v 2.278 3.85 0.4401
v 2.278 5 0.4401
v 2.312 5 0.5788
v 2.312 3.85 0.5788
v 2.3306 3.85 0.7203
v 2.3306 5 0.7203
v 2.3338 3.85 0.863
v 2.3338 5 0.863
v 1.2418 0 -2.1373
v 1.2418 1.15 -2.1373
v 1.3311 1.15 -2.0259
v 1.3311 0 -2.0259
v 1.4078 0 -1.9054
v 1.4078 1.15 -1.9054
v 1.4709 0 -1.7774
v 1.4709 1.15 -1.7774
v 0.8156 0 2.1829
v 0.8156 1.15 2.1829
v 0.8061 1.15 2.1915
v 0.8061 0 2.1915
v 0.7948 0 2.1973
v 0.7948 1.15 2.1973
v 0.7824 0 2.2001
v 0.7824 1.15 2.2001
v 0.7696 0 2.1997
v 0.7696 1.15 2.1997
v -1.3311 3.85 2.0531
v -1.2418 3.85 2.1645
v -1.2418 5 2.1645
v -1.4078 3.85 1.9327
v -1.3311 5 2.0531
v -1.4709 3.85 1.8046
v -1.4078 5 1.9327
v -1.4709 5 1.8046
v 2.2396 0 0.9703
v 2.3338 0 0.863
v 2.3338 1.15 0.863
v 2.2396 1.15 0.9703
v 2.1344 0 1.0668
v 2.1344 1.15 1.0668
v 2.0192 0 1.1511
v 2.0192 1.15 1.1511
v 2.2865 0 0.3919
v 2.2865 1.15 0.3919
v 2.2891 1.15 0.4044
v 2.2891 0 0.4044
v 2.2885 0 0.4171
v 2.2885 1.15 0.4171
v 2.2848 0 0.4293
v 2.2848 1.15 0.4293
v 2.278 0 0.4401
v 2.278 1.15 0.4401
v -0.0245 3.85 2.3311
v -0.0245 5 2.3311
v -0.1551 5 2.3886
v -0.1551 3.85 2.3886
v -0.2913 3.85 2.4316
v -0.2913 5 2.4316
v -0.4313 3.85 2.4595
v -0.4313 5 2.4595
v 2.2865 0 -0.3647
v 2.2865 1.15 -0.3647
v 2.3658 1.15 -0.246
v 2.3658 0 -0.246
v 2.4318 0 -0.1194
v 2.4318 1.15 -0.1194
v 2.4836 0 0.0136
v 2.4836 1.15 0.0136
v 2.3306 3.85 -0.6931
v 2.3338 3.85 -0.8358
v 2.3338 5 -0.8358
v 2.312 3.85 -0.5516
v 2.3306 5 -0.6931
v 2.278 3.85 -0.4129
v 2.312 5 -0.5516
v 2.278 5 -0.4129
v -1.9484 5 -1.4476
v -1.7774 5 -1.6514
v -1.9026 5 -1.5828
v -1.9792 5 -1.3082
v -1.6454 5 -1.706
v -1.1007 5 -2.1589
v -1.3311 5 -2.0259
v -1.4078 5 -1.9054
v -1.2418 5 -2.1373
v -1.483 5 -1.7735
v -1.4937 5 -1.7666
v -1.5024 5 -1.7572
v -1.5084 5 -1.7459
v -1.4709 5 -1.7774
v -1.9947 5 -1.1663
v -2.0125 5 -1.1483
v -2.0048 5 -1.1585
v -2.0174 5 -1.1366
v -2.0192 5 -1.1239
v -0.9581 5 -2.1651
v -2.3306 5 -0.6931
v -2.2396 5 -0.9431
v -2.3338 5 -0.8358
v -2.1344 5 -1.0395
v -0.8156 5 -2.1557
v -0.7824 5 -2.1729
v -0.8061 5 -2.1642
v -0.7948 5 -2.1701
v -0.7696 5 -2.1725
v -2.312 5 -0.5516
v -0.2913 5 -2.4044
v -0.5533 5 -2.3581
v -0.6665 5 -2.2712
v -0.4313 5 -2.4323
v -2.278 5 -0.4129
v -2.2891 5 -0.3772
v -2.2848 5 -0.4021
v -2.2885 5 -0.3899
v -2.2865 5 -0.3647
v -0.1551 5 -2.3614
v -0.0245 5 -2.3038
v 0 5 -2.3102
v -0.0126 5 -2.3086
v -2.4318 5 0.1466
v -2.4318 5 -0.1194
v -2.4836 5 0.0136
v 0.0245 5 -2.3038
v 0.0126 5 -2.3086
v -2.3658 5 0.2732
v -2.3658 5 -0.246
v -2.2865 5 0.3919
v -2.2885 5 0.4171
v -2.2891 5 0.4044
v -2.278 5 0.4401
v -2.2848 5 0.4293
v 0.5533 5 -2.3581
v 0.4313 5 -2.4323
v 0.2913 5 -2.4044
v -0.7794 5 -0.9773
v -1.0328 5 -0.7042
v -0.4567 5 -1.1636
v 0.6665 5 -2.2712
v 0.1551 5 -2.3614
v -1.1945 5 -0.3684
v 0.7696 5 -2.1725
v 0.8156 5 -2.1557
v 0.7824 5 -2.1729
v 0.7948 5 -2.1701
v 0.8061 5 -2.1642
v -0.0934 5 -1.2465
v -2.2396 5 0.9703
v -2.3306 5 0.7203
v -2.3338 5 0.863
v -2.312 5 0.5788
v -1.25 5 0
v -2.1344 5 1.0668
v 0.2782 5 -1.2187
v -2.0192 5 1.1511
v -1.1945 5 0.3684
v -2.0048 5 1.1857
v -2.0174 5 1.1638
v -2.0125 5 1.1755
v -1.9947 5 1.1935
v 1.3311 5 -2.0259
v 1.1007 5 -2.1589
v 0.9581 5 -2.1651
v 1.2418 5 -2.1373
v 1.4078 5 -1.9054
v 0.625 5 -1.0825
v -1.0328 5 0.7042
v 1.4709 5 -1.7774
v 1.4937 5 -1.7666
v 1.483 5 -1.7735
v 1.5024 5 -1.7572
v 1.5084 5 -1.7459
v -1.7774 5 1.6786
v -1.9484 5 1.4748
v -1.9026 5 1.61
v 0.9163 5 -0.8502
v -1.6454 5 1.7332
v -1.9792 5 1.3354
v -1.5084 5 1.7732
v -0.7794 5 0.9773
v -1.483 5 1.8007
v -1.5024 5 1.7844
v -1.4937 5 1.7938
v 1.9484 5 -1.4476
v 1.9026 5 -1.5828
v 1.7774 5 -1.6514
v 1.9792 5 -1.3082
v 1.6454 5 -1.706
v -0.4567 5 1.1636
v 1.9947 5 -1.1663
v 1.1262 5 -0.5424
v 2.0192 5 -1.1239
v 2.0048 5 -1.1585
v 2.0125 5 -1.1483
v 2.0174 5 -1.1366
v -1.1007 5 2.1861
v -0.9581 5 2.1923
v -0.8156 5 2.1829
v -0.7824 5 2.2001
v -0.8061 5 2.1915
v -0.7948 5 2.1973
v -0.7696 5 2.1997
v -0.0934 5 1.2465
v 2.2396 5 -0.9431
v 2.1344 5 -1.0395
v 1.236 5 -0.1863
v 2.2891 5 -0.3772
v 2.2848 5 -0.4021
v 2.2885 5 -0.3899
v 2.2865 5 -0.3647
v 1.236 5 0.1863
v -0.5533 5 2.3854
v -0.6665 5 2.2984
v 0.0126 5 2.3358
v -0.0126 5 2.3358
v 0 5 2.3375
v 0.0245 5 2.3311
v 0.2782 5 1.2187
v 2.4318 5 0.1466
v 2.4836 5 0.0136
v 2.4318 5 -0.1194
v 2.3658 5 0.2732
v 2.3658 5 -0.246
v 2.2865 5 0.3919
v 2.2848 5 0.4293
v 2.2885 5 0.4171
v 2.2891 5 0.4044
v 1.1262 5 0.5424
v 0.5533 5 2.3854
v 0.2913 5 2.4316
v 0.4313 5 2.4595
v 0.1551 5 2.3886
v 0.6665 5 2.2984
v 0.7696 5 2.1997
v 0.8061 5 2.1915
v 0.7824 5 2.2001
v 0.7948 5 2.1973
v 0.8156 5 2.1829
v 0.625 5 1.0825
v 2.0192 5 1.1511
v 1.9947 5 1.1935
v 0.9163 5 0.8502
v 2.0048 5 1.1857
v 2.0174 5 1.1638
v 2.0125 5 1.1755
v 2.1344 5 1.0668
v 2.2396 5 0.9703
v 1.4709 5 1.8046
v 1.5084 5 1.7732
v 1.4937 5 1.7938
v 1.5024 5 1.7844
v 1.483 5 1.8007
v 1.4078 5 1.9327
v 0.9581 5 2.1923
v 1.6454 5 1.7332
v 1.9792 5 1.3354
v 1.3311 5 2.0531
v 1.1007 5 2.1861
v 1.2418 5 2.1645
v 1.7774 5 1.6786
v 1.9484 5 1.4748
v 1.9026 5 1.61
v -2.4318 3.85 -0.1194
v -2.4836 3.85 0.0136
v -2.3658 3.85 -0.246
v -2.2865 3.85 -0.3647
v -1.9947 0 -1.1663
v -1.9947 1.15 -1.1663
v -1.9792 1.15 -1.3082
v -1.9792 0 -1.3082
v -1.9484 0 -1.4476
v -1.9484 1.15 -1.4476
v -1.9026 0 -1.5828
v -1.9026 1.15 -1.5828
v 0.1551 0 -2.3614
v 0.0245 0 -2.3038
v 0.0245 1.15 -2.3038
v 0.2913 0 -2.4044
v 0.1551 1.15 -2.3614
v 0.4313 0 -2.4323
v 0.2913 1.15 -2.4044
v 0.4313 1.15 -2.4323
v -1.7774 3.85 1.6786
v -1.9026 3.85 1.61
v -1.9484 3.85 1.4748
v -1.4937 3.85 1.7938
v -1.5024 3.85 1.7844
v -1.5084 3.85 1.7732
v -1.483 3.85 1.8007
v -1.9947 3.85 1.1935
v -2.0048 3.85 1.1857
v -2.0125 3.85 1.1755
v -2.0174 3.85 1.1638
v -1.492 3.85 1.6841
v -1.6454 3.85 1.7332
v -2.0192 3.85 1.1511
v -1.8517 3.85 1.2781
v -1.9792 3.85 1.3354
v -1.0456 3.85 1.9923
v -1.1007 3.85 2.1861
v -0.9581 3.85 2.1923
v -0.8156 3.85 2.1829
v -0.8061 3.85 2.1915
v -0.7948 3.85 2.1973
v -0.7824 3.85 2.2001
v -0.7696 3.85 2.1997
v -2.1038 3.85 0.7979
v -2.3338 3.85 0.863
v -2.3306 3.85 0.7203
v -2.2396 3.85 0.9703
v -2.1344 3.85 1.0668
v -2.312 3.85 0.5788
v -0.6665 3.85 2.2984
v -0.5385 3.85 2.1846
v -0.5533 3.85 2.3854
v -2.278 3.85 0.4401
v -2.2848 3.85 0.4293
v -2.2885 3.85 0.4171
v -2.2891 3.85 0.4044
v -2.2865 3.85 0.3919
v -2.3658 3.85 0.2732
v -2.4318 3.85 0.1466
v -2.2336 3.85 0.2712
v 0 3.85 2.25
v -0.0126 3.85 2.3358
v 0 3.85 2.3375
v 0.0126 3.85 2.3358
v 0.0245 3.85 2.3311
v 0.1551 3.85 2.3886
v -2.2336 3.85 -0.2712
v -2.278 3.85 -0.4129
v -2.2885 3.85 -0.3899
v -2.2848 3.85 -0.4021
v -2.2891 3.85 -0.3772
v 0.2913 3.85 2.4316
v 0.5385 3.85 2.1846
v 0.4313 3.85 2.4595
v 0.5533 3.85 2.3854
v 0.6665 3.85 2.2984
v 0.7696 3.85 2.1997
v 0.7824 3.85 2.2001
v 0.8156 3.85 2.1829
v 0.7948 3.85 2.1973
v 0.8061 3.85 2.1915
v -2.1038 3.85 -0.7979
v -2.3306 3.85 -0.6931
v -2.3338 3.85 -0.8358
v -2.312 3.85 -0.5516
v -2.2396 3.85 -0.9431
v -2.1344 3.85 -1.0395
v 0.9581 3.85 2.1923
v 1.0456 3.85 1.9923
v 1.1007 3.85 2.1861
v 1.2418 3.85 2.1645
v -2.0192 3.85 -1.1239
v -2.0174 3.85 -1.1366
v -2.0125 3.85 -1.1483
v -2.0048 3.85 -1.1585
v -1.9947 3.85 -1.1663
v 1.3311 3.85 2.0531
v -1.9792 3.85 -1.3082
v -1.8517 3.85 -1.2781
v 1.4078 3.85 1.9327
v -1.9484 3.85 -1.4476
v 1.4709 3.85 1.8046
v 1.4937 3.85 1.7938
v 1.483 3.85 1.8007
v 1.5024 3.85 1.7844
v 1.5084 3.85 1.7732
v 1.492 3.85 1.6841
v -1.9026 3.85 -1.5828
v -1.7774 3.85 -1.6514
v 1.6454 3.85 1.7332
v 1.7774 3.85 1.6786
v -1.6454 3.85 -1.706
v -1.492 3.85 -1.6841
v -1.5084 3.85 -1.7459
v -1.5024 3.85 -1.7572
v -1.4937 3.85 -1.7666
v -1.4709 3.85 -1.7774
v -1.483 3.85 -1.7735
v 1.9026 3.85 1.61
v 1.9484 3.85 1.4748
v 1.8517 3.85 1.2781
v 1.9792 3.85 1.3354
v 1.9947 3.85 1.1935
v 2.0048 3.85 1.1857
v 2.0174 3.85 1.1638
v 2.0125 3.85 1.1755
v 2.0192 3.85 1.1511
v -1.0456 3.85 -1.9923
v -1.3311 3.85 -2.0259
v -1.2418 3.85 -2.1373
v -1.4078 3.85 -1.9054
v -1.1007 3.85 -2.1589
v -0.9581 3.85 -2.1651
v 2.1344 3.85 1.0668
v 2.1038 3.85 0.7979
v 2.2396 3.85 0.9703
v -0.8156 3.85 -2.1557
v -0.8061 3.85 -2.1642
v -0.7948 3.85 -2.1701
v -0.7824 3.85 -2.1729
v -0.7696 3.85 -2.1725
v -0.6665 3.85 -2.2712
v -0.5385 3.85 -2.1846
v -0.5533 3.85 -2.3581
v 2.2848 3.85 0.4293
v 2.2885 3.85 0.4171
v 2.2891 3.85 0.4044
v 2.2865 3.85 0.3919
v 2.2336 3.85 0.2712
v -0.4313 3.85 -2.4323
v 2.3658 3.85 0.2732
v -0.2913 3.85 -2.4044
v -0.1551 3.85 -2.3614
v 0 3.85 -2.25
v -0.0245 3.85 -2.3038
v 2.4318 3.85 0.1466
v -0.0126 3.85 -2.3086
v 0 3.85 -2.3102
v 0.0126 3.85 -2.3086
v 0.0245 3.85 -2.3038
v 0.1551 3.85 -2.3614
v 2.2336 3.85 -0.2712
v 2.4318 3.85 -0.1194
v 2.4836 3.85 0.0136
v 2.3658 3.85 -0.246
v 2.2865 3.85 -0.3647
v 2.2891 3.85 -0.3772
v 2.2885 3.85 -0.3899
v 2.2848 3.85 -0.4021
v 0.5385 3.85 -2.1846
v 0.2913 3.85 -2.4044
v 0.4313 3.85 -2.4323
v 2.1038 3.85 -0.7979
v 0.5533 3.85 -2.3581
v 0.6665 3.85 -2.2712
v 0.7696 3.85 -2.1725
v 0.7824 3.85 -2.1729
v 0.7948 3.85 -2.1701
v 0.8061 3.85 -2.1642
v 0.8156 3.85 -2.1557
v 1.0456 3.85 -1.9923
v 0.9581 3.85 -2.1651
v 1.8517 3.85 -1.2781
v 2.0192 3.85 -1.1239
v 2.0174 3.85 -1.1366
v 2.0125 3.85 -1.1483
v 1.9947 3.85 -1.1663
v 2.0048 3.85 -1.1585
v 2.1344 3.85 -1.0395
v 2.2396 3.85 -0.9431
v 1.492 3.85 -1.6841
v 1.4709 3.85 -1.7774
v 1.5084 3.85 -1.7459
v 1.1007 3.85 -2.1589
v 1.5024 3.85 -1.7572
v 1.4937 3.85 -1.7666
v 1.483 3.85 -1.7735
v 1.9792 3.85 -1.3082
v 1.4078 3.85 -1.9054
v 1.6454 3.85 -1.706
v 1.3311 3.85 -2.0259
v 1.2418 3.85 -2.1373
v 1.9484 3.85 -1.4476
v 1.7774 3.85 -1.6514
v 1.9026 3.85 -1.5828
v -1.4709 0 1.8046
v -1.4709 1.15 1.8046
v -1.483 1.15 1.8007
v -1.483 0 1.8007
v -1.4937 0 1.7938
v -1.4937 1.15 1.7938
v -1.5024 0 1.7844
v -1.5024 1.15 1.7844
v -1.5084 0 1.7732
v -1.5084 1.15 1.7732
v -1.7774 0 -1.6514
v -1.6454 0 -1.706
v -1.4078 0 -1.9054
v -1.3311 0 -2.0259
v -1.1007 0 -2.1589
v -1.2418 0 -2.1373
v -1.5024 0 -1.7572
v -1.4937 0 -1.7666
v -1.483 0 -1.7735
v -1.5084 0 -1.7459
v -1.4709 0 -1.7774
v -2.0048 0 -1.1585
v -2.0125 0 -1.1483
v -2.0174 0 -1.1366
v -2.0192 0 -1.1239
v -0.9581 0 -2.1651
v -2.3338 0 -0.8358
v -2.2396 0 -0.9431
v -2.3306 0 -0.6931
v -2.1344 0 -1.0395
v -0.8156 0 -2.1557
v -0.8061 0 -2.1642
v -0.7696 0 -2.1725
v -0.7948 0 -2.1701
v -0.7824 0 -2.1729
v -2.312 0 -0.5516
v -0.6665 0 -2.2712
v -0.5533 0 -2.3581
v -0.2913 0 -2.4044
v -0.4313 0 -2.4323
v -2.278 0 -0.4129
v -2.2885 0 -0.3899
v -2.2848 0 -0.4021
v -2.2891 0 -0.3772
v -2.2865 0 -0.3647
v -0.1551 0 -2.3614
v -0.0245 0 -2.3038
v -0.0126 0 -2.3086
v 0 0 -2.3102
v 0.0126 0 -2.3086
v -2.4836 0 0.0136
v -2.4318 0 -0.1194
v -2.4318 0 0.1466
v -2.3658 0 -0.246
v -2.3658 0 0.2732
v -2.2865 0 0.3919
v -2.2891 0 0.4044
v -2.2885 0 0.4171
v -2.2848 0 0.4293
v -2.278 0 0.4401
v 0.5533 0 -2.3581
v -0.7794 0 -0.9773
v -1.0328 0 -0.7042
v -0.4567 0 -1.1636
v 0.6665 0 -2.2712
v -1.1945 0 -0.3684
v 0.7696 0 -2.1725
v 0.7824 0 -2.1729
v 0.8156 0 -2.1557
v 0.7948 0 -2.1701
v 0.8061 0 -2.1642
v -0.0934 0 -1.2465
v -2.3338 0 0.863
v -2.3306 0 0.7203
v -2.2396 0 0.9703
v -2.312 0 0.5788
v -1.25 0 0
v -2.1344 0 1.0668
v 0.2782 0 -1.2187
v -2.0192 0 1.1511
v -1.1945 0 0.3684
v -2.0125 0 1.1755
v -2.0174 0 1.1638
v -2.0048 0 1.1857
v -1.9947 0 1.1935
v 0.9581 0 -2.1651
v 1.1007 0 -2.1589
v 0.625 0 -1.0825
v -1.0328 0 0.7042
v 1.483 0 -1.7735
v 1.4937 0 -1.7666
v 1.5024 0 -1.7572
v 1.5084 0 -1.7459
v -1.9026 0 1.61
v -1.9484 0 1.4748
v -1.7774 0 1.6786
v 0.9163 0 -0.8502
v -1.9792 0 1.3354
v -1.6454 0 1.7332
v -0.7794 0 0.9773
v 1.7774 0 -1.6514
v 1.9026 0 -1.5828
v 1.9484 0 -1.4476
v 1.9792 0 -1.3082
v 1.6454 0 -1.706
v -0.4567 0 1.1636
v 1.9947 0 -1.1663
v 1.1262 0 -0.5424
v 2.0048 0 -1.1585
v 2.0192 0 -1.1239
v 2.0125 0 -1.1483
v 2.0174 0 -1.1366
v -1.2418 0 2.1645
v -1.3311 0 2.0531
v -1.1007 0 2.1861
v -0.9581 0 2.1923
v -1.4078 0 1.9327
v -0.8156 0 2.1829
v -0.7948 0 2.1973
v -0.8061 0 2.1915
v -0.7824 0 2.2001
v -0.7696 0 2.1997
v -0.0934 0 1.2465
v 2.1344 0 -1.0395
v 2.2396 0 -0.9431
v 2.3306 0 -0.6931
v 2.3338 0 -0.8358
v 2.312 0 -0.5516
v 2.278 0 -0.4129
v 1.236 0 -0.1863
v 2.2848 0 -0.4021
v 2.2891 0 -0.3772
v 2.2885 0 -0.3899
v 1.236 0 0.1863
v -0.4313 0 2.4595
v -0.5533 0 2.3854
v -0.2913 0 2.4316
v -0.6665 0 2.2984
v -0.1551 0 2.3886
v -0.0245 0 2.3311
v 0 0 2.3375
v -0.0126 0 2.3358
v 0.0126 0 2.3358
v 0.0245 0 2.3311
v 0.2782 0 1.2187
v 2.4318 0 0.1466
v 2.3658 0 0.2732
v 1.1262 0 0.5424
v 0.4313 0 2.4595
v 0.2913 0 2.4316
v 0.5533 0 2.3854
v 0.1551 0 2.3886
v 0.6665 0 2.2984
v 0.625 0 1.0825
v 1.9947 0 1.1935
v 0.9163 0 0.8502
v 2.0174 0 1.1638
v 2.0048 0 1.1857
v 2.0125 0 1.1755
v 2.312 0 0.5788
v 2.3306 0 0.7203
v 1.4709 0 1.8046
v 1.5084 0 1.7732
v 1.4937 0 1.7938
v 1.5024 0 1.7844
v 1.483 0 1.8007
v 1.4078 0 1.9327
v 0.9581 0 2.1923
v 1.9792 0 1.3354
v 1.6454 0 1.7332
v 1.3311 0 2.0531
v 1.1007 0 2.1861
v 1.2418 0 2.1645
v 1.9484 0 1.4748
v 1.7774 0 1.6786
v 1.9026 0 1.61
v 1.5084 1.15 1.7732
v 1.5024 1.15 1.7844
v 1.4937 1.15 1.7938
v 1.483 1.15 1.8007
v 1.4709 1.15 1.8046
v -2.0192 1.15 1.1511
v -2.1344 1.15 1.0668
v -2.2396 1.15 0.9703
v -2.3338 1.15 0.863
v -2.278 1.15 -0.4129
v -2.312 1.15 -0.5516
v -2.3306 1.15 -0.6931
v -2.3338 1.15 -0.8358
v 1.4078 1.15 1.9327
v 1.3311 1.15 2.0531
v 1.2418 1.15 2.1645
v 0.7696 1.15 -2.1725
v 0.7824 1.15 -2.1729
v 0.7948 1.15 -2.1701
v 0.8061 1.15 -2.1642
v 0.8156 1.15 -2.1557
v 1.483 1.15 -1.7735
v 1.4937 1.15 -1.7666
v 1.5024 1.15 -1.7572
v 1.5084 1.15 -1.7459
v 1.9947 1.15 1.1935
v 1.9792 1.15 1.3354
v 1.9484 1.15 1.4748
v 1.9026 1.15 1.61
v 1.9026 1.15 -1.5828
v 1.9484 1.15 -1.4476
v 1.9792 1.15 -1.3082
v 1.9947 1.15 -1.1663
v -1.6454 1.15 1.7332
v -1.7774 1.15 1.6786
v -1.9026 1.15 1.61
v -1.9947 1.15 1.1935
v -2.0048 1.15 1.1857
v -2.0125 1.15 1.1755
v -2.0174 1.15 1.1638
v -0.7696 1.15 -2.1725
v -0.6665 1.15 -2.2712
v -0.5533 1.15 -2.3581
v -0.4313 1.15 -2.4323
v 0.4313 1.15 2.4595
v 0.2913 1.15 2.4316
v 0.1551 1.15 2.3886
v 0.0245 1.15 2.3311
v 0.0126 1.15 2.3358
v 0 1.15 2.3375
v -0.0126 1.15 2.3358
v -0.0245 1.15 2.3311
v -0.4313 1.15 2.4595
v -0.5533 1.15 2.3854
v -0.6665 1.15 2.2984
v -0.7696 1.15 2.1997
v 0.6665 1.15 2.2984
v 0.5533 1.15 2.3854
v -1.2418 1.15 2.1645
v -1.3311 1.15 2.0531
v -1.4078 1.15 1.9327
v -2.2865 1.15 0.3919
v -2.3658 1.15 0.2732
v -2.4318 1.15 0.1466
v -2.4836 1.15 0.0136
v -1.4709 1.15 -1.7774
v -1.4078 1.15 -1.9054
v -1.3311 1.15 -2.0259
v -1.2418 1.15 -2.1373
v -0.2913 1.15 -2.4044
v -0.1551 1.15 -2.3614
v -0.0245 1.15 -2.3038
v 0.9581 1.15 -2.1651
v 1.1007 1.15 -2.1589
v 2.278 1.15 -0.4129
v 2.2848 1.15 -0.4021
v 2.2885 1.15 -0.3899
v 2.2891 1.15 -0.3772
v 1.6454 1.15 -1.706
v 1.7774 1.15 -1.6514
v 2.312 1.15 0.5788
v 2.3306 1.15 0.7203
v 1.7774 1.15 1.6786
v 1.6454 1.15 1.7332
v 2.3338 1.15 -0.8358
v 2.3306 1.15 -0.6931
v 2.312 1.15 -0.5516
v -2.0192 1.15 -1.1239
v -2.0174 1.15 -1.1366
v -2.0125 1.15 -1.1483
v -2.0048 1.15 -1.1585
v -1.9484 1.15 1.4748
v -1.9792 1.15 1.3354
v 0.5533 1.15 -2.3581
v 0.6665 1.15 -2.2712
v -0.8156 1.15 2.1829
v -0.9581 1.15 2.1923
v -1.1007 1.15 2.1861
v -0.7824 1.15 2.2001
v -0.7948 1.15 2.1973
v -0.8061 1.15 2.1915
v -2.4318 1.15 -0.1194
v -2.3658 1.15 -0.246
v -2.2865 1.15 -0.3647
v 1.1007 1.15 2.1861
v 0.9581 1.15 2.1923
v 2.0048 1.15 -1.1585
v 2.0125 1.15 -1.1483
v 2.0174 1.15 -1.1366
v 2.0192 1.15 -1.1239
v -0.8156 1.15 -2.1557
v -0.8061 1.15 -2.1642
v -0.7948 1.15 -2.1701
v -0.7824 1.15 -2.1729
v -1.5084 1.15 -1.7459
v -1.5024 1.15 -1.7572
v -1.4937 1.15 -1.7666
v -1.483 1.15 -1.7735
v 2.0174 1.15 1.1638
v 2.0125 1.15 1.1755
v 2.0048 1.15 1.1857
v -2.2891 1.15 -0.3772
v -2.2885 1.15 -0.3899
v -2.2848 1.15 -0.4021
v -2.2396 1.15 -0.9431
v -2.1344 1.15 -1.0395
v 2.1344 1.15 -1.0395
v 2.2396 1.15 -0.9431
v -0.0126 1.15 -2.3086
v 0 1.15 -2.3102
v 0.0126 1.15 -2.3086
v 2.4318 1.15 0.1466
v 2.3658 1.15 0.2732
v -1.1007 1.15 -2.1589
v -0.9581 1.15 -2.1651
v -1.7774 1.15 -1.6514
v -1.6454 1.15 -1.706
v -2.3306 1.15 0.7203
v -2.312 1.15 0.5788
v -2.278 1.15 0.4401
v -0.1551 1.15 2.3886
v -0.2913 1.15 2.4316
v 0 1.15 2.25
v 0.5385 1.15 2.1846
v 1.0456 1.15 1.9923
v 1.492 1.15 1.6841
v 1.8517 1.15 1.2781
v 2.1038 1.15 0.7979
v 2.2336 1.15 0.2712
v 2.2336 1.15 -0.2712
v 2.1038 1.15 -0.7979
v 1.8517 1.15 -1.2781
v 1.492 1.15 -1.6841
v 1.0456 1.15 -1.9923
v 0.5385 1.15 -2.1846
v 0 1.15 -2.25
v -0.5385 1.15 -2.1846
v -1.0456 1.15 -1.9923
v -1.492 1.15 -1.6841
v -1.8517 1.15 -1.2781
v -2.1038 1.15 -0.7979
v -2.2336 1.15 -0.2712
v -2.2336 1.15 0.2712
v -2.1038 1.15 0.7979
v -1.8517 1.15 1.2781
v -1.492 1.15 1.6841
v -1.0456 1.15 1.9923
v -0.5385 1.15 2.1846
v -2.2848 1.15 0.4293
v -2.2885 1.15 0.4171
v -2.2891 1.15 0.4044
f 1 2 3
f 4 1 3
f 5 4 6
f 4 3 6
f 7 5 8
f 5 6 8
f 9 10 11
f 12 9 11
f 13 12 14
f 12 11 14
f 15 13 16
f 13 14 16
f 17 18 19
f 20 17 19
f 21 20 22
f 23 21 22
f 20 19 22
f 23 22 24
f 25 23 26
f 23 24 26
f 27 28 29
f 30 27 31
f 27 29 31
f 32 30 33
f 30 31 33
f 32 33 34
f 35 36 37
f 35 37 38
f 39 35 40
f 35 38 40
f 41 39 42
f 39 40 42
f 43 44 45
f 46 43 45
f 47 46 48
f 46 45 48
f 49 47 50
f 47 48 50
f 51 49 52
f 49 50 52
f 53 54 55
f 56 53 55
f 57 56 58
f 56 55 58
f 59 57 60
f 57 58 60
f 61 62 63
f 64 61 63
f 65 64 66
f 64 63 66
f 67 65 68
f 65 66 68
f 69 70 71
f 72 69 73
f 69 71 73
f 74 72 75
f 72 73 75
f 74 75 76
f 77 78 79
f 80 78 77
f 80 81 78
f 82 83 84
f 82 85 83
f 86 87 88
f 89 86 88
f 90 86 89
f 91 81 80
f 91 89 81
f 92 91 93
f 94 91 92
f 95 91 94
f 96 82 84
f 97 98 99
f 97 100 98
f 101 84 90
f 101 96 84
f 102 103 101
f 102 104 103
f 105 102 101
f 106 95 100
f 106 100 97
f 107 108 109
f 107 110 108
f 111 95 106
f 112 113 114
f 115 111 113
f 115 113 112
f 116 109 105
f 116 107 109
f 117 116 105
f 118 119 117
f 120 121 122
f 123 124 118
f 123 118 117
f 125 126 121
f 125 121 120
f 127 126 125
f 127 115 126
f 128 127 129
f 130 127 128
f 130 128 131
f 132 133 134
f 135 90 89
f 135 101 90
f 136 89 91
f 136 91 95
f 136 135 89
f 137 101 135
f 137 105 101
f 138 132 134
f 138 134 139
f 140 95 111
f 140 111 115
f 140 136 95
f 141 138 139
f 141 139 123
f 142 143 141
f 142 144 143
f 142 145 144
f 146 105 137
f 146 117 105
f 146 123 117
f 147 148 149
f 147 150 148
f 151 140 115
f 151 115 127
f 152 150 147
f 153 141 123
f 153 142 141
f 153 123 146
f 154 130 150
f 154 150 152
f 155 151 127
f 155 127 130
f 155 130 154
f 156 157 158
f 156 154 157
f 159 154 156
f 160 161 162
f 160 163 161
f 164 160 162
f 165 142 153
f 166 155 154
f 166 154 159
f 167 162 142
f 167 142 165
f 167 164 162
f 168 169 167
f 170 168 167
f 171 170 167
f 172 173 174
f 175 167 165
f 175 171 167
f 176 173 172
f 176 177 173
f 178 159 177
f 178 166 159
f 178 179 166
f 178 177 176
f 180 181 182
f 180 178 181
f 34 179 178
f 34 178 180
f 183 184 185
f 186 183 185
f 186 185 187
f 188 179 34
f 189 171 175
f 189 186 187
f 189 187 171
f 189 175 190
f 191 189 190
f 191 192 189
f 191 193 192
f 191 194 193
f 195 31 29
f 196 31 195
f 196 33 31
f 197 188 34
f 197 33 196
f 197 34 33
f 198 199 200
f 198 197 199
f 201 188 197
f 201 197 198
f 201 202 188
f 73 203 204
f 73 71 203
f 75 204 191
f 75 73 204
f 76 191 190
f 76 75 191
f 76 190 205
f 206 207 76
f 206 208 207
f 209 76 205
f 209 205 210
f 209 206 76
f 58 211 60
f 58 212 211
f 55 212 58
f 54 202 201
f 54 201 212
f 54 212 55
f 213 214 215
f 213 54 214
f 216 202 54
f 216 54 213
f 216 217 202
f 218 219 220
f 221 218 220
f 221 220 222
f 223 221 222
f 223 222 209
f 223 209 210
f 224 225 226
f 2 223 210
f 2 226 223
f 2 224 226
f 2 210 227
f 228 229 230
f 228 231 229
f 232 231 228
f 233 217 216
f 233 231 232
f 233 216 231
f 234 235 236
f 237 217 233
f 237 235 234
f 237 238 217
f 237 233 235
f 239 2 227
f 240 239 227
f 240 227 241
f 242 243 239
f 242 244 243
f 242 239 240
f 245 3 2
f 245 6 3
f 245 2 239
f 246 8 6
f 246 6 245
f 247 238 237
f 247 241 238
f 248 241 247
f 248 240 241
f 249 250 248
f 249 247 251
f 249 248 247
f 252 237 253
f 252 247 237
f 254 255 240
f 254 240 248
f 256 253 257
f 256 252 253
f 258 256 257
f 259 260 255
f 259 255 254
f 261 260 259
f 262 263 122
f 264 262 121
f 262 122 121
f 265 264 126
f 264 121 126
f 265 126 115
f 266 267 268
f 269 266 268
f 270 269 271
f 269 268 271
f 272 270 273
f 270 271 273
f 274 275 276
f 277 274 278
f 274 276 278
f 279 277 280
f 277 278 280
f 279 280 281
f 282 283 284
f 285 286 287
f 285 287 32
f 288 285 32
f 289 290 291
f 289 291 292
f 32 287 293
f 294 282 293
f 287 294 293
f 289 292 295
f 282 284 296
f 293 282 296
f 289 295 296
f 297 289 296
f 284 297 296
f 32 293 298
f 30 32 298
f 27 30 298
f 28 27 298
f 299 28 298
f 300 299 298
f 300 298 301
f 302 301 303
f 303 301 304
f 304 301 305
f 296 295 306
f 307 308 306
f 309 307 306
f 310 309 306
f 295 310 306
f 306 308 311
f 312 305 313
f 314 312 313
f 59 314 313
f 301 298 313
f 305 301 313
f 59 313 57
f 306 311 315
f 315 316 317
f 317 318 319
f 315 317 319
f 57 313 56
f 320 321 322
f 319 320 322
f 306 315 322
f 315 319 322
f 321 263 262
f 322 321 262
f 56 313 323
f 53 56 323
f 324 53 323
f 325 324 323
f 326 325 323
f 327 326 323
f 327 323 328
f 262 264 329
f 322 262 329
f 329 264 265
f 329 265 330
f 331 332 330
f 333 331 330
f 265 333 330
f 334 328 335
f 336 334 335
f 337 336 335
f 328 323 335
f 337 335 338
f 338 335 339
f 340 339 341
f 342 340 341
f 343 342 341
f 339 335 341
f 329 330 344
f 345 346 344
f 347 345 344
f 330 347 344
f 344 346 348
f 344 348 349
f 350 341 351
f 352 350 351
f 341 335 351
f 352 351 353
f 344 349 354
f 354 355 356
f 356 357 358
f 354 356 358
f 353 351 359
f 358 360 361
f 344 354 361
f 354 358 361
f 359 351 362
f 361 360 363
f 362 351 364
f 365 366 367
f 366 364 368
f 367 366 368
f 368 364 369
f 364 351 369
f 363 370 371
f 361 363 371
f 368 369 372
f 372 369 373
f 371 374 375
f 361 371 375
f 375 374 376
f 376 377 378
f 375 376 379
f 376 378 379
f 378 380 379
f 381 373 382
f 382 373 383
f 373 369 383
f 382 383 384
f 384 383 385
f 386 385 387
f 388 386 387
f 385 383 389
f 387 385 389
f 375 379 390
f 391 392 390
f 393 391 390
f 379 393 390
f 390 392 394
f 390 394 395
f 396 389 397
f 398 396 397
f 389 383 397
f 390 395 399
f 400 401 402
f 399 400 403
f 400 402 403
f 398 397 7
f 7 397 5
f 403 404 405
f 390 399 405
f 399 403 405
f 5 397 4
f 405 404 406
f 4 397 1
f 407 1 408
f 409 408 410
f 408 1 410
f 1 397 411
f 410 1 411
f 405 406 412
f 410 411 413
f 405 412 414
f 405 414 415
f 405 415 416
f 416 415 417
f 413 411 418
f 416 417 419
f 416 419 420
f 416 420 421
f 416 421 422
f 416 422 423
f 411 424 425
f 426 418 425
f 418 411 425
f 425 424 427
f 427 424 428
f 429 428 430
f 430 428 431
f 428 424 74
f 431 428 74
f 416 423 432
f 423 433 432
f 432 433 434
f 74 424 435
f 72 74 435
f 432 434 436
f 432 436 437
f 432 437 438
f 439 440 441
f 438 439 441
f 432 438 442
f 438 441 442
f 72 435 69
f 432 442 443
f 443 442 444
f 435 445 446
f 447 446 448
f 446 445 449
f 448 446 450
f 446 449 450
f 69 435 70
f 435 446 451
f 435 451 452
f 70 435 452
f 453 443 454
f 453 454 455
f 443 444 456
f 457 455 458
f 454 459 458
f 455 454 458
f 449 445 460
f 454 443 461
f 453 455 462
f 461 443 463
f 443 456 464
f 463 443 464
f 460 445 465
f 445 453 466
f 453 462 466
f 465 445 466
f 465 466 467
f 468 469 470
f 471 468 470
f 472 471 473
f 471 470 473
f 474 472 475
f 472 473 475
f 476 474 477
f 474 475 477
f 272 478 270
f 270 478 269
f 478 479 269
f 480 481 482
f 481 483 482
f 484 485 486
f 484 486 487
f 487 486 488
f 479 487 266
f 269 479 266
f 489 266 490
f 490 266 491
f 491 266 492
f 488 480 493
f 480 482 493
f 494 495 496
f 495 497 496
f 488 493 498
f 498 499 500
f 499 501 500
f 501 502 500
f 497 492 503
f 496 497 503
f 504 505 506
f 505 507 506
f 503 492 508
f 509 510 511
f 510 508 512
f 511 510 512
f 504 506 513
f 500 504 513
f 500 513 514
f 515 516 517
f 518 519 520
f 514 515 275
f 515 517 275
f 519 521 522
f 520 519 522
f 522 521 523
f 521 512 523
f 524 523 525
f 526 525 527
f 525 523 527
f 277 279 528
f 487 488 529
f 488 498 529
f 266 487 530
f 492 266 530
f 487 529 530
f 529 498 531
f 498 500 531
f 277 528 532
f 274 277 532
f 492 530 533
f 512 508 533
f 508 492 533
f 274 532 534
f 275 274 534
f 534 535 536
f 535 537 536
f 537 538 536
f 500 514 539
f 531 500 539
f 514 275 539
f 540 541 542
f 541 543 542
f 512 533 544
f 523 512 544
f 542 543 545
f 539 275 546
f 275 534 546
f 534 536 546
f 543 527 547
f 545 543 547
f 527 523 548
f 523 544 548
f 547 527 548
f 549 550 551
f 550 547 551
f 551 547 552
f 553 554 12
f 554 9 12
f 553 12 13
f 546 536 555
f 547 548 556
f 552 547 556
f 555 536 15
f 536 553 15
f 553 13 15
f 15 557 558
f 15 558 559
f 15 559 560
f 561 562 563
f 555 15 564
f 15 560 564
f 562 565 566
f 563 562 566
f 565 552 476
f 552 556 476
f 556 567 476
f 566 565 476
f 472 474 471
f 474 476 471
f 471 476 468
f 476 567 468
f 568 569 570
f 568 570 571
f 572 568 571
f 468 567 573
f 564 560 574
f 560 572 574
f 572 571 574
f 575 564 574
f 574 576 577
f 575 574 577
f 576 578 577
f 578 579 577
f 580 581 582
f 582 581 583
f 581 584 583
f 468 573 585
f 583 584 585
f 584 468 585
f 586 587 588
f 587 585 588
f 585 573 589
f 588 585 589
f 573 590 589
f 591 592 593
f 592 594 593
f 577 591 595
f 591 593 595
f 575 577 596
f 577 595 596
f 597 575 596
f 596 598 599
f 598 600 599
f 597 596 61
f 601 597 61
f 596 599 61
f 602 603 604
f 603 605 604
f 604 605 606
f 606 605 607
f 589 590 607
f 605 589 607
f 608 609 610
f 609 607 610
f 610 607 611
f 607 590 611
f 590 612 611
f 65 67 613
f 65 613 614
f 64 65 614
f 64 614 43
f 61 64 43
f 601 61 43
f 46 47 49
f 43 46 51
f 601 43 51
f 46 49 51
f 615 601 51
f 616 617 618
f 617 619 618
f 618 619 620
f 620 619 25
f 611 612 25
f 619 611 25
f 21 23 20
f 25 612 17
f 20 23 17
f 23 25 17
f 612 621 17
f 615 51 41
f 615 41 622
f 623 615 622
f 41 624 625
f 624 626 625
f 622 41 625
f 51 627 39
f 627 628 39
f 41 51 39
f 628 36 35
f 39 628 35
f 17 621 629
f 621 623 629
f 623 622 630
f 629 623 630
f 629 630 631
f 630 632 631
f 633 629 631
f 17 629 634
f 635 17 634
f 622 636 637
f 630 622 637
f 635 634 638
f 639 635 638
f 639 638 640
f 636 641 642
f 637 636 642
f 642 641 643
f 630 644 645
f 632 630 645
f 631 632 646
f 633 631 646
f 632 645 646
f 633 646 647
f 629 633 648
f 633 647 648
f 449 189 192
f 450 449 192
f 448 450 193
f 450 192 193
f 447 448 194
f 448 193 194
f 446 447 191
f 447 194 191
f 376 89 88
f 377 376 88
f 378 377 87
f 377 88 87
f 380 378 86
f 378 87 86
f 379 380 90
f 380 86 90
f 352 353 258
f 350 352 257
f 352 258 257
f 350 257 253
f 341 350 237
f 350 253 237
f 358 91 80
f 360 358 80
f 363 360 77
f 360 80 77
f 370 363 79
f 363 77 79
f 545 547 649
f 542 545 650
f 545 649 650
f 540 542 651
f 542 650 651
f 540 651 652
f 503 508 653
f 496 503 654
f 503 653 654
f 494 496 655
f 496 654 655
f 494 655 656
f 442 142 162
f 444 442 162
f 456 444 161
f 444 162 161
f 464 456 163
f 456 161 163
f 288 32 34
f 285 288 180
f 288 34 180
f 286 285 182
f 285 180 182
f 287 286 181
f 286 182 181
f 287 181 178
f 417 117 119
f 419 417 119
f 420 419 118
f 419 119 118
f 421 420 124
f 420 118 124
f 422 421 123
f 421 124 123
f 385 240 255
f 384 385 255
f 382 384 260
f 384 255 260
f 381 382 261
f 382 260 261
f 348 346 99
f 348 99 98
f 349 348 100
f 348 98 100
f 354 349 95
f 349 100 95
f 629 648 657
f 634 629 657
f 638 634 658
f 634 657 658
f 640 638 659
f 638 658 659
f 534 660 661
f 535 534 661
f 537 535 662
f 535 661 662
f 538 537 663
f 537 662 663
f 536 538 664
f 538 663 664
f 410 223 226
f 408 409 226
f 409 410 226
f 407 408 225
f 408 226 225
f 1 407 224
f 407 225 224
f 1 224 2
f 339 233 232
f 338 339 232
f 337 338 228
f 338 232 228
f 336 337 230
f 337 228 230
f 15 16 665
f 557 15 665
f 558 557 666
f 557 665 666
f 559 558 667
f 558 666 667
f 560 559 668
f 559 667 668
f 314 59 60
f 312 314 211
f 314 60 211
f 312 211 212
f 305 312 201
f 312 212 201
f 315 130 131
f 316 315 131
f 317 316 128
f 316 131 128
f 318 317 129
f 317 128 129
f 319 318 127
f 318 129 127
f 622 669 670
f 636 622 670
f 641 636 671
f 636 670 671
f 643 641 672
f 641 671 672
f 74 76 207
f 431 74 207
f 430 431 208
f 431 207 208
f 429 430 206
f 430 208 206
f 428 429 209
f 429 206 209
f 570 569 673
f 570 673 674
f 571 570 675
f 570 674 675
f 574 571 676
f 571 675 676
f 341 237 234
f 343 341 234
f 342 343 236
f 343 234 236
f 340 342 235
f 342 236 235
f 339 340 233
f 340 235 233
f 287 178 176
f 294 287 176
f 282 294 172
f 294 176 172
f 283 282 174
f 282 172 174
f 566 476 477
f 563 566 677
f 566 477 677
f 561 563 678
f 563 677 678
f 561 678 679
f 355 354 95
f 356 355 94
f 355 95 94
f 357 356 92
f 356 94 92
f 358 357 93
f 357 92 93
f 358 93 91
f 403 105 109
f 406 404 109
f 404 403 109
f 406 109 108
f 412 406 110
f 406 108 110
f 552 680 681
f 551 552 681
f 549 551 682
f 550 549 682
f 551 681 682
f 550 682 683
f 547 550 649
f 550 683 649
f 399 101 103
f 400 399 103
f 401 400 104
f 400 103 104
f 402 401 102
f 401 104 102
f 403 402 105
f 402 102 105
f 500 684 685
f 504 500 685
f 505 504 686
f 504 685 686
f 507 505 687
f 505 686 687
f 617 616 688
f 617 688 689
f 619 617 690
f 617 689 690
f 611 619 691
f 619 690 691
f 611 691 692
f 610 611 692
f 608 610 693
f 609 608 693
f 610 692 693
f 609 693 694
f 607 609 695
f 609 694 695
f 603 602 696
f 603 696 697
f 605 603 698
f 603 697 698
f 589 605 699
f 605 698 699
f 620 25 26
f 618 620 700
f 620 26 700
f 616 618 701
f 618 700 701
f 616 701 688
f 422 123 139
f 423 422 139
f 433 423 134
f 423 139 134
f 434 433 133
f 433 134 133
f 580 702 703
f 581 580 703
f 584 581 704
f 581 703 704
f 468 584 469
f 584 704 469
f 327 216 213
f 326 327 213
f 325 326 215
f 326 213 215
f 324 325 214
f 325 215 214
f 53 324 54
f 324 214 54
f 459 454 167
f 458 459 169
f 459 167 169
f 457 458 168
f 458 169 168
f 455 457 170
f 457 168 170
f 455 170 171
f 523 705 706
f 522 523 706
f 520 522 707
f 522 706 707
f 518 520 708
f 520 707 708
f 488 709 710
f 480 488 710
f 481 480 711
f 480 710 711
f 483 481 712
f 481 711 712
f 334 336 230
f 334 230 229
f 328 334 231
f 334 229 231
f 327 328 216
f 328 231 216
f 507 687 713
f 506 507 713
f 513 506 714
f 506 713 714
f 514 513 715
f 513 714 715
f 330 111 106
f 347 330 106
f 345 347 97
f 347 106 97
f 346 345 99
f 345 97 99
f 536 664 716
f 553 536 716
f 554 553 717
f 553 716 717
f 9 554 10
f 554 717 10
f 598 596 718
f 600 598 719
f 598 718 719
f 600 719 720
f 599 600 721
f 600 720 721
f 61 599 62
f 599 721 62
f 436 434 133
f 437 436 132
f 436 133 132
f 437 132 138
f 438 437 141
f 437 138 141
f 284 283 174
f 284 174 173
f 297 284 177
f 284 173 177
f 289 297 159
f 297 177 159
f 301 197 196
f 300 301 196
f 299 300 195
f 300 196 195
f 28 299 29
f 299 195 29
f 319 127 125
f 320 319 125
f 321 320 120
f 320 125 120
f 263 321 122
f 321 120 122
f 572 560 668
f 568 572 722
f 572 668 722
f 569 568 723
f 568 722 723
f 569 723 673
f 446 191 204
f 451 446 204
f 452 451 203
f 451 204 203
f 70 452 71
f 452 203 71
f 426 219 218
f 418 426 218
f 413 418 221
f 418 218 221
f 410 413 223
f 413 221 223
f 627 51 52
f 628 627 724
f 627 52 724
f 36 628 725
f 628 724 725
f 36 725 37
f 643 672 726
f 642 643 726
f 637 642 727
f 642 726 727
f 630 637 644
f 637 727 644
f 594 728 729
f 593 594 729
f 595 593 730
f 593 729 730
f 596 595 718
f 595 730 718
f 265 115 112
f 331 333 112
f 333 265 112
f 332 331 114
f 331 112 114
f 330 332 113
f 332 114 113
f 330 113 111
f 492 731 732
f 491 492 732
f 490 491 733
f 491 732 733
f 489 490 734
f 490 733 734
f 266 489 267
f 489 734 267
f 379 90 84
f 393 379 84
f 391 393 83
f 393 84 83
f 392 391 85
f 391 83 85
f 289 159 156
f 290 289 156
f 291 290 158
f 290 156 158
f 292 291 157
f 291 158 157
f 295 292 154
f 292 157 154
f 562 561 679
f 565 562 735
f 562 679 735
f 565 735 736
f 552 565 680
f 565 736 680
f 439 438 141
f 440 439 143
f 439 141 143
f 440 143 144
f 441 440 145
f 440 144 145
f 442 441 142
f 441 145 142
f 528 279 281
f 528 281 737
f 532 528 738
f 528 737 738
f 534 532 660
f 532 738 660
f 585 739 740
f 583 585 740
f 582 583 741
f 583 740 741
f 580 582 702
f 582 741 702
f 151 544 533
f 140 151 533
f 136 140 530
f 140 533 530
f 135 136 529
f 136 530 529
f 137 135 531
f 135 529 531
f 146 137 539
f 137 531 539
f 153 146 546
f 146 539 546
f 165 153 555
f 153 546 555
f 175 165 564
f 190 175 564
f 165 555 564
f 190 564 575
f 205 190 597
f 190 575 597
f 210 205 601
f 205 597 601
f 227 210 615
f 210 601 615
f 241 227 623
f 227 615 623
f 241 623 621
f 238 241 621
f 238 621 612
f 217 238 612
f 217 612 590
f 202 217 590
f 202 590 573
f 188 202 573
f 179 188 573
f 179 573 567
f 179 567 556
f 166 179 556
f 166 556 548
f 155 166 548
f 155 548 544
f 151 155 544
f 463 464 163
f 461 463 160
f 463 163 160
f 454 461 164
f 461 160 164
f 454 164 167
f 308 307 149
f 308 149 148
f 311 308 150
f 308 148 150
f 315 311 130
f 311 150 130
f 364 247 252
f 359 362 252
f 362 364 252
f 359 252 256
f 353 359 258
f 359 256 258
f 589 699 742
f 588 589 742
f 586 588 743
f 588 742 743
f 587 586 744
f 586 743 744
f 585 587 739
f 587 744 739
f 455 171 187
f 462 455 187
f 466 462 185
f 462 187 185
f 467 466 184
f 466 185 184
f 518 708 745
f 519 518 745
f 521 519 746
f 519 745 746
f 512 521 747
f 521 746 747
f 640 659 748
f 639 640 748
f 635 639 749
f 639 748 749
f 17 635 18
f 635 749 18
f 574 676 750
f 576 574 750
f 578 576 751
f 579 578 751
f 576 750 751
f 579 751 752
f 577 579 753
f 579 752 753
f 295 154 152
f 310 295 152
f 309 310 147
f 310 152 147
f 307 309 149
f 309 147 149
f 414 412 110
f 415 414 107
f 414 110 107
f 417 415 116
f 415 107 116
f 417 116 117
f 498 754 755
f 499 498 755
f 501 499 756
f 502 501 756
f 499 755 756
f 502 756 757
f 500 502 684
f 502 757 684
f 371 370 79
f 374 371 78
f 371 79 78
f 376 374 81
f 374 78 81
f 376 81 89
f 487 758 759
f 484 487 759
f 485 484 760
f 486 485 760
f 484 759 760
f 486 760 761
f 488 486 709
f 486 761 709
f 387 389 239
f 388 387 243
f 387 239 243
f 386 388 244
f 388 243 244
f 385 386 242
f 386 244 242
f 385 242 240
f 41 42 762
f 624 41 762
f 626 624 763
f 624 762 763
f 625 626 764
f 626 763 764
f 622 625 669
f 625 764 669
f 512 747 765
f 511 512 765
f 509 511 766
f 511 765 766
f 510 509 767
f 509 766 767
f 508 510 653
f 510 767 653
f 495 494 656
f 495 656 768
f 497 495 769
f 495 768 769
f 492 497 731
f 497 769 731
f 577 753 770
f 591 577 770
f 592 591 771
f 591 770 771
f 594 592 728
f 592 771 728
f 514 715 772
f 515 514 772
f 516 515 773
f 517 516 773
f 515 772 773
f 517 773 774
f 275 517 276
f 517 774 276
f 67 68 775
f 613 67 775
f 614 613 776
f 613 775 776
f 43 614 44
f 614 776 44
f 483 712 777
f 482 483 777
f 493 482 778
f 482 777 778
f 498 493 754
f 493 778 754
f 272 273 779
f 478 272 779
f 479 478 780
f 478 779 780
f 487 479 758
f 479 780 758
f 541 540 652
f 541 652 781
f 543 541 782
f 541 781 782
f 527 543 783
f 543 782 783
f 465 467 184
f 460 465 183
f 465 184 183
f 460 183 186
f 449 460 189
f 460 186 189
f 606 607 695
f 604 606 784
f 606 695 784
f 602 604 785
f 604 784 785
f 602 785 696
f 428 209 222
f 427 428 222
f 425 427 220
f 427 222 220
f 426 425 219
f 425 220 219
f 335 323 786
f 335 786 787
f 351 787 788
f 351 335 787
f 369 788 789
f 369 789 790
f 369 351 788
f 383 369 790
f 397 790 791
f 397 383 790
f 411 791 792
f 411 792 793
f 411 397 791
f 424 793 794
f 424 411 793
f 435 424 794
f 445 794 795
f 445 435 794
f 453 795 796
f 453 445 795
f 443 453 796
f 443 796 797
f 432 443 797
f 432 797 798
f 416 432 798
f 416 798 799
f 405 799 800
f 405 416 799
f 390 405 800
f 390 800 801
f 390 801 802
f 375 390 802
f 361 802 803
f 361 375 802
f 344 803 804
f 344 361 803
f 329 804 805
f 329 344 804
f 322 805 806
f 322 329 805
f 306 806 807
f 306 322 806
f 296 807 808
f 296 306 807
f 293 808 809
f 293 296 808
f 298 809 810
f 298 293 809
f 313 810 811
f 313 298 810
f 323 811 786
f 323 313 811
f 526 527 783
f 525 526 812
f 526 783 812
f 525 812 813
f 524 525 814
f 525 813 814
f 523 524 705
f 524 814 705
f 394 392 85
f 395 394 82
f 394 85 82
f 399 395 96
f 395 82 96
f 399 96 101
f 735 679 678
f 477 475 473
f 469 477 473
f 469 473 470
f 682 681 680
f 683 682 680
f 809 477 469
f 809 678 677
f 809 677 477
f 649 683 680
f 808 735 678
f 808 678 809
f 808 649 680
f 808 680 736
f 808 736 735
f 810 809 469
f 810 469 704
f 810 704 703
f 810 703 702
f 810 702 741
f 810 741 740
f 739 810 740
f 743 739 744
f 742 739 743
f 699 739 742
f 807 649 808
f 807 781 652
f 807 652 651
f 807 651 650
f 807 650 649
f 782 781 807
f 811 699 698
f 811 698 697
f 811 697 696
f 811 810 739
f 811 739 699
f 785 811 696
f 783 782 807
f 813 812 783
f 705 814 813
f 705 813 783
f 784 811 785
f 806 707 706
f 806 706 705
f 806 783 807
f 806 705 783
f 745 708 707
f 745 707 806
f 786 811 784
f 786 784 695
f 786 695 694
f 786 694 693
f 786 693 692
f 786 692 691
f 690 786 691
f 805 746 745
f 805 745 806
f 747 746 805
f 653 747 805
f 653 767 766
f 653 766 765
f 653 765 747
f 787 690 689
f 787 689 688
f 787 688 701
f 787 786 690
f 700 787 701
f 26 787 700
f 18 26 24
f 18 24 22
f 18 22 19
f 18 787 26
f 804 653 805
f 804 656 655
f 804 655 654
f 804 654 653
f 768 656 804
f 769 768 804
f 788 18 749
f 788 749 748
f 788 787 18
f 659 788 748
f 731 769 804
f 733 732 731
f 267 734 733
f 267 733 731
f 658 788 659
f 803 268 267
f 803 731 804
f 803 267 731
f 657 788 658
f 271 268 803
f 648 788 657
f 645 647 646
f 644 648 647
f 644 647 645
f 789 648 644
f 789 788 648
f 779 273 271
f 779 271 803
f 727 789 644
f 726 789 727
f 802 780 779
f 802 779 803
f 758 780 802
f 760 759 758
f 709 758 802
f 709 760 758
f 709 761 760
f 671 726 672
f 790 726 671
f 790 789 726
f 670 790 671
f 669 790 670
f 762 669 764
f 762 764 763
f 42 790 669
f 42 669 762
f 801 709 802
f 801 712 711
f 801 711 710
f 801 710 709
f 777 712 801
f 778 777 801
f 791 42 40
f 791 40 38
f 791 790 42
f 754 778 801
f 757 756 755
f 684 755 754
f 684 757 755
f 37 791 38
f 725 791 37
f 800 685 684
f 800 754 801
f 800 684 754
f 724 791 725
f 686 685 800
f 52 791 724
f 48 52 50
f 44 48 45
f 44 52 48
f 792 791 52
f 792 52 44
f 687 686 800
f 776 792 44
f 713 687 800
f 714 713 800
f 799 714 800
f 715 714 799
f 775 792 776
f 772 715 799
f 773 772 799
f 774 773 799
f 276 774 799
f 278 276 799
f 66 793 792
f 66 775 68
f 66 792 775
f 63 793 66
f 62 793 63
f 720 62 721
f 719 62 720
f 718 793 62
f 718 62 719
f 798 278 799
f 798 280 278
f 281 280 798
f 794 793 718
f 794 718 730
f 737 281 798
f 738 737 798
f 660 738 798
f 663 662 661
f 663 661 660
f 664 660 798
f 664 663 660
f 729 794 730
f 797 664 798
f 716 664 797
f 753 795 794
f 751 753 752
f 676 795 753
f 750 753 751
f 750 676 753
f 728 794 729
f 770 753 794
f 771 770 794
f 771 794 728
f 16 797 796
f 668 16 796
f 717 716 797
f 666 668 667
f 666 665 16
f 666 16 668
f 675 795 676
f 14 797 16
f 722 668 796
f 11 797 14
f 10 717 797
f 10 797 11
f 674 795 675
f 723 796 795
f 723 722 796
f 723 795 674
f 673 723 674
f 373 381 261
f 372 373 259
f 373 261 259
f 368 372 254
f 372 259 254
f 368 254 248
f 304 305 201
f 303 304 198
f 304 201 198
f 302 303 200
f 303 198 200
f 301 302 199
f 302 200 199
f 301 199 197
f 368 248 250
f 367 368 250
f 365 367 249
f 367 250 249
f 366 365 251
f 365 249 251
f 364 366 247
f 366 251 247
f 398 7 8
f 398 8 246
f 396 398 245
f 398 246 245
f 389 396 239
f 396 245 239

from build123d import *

# Parameters (mm, degrees)
SKETCH1_R           = 2.51
BOSS_EXTRUDE1_DEPTH = 5
CUT_EXTRUDE2_DEPTH  = 5
CIRPATTERN1_COUNT   = 18
M3_TAPPED_HOLE1_D   = 2.5
SKETCH8_R           = 3.25
SKETCH8_R_2         = 2.25
CUT_EXTRUDE3_DEPTH  = 2.7


with BuildPart() as part:
    # Sketch1 → Boss-Extrude1 (new body)
    with BuildSketch(Plane(origin=(0, 0, 0), x_dir=(1, 0, 0), z_dir=(0, 1, 0))):
        with Locations(Location((0, 0, 0), (0, 0, 270))):
            Circle(SKETCH1_R)
    extrude(amount=BOSS_EXTRUDE1_DEPTH)

    # Sketch2 → Cut-Extrude2 (cut)
    with BuildSketch(Plane(origin=(0, 5, 0), x_dir=(1, 0, 0), z_dir=(0, 1, 0))):
        with BuildLine():
            ThreePointArc((0.569091169, 2.444633969), (0, 2.615621061), (-0.569091169, 2.444633969))
            ThreePointArc((-0.569091169, 2.444633969), (-0.289139314, 2.403802024), (-0.024469936, 2.303849986))
            ThreePointArc((-0.024469936, 2.303849986), (0, 2.310246979), (0.024469936, 2.303849986))
            ThreePointArc((0.024469936, 2.303849986), (0.289139314, 2.403802024), (0.569091169, 2.444633969))
        make_face()
    cut_extrude2 = extrude(amount=-CUT_EXTRUDE2_DEPTH, mode=Mode.SUBTRACT)

    # CirPattern1: Cut-Extrude2 ×18 about axis
    cirpattern1_axis = Axis((0, 0, 0.013606971), (0, 1, 0))
    for i in range(1, CIRPATTERN1_COUNT):
        add(cut_extrude2.rotate(cirpattern1_axis, i * 360 / CIRPATTERN1_COUNT), mode=Mode.SUBTRACT)

    # M3 Tapped Hole1 (through all)
    with Locations(Plane(origin=(0, 5, 0), x_dir=(1, 0, 0), z_dir=(0, 1, 0))):
        with Locations((0, 0)):
            Hole(M3_TAPPED_HOLE1_D / 2)

    # Sketch8 → Cut-Extrude3 (cut)
    with BuildSketch(Plane(origin=(0, 3.85, 0), x_dir=(1, 0, 0), z_dir=(0, 1, 0))):
        Circle(SKETCH8_R)
        with Locations(Location((0, 0, 0), (0, 0, 270))):
            Circle(SKETCH8_R_2, mode=Mode.SUBTRACT)
    extrude(amount=-CUT_EXTRUDE3_DEPTH, mode=Mode.SUBTRACT)


solid = part.part
